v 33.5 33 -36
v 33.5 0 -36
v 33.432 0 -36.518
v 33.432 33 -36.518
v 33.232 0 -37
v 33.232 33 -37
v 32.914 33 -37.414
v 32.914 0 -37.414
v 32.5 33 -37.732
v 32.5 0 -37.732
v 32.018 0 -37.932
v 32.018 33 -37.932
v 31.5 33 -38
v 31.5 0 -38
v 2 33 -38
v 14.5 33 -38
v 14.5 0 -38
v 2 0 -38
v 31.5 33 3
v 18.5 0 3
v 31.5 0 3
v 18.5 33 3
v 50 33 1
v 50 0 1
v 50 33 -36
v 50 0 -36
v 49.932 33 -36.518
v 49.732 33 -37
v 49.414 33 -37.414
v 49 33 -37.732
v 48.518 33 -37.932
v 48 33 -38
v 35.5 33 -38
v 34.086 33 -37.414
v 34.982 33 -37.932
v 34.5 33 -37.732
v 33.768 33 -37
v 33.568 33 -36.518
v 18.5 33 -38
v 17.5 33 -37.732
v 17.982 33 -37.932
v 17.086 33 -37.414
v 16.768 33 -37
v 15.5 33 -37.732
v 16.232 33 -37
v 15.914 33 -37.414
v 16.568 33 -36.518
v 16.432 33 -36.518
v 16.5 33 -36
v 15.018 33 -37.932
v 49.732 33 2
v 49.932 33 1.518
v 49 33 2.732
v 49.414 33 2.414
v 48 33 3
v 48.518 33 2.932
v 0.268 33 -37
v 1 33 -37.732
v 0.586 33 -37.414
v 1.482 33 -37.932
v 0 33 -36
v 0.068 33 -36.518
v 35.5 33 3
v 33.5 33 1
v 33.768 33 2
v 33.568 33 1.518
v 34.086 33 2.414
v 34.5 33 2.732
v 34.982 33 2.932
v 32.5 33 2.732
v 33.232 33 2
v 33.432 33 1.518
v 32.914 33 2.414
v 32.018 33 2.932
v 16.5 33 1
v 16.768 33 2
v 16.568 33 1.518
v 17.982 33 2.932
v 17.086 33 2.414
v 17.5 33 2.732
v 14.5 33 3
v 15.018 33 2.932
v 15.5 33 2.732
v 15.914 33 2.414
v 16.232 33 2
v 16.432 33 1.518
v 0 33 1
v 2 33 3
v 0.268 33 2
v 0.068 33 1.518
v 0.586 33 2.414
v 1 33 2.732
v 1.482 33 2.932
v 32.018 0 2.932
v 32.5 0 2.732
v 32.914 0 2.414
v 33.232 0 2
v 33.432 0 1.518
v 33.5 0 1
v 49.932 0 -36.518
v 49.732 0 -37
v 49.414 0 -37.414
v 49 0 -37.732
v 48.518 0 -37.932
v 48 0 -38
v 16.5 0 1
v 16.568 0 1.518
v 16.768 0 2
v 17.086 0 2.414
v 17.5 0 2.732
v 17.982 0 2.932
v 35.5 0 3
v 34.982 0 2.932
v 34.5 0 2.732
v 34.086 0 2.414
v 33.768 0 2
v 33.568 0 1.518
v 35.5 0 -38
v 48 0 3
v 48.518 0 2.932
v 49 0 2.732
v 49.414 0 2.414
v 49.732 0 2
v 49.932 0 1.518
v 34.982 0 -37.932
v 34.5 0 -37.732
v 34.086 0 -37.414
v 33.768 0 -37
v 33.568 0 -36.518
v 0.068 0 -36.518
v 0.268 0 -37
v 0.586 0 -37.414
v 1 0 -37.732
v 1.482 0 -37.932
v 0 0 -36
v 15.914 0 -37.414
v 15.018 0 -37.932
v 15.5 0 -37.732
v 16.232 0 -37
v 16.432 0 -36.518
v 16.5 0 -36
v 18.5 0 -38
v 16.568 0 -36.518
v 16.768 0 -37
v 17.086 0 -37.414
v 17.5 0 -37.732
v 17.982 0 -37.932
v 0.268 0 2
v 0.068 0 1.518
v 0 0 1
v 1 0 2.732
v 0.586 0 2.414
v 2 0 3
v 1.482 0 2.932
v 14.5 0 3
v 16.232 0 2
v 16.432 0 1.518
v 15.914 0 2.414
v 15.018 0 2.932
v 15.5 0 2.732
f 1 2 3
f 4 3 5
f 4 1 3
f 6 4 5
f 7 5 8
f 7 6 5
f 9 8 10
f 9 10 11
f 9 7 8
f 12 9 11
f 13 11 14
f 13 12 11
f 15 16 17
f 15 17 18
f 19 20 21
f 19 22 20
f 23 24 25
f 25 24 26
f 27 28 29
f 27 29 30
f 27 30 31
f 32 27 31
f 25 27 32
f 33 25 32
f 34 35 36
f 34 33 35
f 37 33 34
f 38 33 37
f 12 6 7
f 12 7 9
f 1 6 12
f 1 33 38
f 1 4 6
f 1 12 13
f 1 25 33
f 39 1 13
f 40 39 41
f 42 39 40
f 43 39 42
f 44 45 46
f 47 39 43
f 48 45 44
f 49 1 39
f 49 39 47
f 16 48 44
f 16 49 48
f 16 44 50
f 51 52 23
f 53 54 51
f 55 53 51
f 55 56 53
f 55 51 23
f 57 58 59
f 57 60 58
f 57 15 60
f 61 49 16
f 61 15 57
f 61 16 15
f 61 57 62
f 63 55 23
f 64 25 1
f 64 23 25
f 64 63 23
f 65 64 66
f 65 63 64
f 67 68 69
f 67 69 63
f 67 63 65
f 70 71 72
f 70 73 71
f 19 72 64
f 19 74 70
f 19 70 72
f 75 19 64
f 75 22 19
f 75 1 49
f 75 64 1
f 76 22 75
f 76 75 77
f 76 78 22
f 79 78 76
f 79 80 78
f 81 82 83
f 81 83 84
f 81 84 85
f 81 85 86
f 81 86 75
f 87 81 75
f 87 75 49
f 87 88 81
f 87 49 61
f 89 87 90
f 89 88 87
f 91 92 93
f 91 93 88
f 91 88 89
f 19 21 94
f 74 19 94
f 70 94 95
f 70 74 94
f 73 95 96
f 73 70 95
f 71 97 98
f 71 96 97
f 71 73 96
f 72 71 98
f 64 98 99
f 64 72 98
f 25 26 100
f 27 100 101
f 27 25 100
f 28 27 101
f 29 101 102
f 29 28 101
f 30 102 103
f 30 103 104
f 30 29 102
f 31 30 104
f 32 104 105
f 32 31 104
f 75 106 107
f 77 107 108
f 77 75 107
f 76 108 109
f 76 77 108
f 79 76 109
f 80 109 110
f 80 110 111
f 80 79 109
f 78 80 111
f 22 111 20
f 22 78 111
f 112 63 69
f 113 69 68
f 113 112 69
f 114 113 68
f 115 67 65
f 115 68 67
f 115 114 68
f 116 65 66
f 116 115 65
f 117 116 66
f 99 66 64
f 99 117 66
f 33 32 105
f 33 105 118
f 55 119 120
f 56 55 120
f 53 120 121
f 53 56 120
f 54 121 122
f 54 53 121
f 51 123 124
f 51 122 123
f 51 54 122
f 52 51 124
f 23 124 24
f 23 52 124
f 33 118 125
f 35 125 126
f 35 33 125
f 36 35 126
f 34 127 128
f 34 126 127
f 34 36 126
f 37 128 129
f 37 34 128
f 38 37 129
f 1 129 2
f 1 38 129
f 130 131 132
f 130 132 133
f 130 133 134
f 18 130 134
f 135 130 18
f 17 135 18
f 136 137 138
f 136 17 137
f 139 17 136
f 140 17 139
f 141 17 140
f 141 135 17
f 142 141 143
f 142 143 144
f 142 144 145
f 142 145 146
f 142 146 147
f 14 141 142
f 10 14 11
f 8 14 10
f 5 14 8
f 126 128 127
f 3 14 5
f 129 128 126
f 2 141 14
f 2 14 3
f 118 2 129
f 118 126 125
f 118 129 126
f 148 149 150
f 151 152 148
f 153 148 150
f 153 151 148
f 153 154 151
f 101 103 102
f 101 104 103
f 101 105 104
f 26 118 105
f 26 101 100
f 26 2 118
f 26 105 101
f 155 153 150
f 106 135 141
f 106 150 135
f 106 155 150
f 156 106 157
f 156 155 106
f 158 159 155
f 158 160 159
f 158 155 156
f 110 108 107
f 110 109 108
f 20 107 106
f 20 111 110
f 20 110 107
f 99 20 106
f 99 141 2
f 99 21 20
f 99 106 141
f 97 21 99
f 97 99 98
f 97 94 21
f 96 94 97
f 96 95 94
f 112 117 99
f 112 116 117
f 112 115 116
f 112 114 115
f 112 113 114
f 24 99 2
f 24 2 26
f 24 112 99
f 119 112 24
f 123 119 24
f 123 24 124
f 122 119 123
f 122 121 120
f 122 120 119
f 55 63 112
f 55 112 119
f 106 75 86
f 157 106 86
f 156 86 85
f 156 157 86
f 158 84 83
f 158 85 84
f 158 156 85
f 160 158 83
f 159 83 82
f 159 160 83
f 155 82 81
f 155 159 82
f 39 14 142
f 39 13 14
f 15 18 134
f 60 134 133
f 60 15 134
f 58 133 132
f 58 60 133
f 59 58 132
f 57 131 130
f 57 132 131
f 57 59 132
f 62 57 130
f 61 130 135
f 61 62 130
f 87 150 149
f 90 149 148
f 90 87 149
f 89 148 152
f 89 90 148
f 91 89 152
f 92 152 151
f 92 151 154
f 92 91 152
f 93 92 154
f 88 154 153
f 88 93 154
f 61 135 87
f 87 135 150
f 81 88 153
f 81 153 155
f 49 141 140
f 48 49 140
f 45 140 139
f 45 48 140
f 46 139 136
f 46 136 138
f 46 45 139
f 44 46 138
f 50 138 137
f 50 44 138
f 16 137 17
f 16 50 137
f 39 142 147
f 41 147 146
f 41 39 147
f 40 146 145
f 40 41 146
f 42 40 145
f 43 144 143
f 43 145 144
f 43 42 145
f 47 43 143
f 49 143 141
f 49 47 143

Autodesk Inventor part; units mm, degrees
ref_plane "YZ Plane" through (0, 0, 0) normal (1, 0, 0) x (0, 1, 0)
ref_plane "XZ Plane" through (0, 0, 0) normal (0, 1, 0) x (-1, 0, 0)
ref_plane "XY Plane" through (0, 0, 0) normal (0, 0, 1) x (1, 0, 0)
sketch "Sketch1" plane through (0, 0, 0) normal (0, 1, 0) x (-1, 0, 0)
  line L0 (0, 0) -> (-50, 0)
  line L1 (-50, 0) -> (-50, -35)
  line L2 (-50, -35) -> (0, -35)
  line L3 (0, -35) -> (0, 0)
  dimension "d0" = 35
  dimension "d1" = 50
extrude "Extrusion1" add sketch "Sketch1" along normal blind 33
sketch "Sketch2" plane through (0, 0, 0) normal (0, 0, 1) x (1, 0, 0)
  line L0 (0, 33) -> (50, 33) projected
  line L1 (16.5, 33) -> (16.5, 0)
  line L2 (0, 0) -> (50, 0) projected
  line L3 (33.5, 33) -> (33.5, 0)
  line L4 (0, 0) -> (0, 33) projected
  line L5 (50, 0) -> (50, 33) projected
  line L6 (0, 0) -> (0, 33) projected
  line L7 (0, 33) -> (16.5, 33)
  line L8 (16.5, 33) -> (16.5, 0)
  line L9 (16.5, 0) -> (0, 0)
  line L10 (0, 0) -> (0, 33)
  line L11 (33.5, 33) -> (50, 33)
  line L12 (50, 33) -> (50, 0)
  line L13 (50, 0) -> (33.5, 0)
  line L14 (33.5, 0) -> (33.5, 33)
  dimension "d4" = 16.5
  dimension "d5" = 16.5
extrude "Extrusion2" add sketch "Sketch2" along normal blind 3 contours L0 L1 L2 L4 | L0 L5 L2 L3
fillet "Fillet1" radius 2 4 edges at (0, 16.5, 3) (16.5, 16.5, 3) (33.5, 16.5, 3) (50, 16.5, 3)
sketch "Sketch3" plane through (16.5, 0, 0) normal (0, 0, 1) x (1, 0, 0)
  line L0 (0, 33) -> (17, 33) projected
  line L1 (17, 0) -> (17, 33) projected
  line L2 (0, 33) -> (17, 33)
  line L3 (17, 33) -> (17, 0)
  line L4 (17, 0) -> (0, 0)
  line L5 (0, 0) -> (0, 33)
  point P0 (-16.5, 0)
extrude "Extrusion3" add sketch "Sketch3" along normal blind 3
fillet "Fillet2" radius 2 2 edges at (16.5, 16.5, 3) (33.5, 16.5, 3)
sketch "Sketch4" plane through (50, 0, -35) normal (0, 0, -1) x (-1, 0, 0)
  line L0 (0, 0) -> (50, 0) projected
  line L1 (33.5, 0) -> (33.5, 33)
  line L2 (0, 33) -> (50, 33) projected
  line L3 (14.5, 0) -> (2, 0) projected
  line L4 (16.5, 0) -> (16.5, 33)
  line L5 (50, 0) -> (50, 33) projected
  line L6 (0, 0) -> (0, 33) projected
  line L7 (50, 0) -> (33.5, 0)
  line L8 (33.5, 0) -> (33.5, 33)
  line L9 (33.5, 33) -> (50, 33)
  line L10 (50, 33) -> (50, 0)
  line L11 (16.5, 0) -> (14.5, 0) projected
  line L12 (16.5, 0) -> (0, 0)
  line L13 (0, 0) -> (0, 33)
  line L14 (0, 33) -> (16.5, 33)
  line L15 (16.5, 33) -> (16.5, 0)
  dimension "d12" = 16.5
  dimension "d13" = 16.5
extrude "Extrusion4" add sketch "Sketch4" along normal blind 3 contours L6 L2 L4 L0 | L2 L5 L0 L1
fillet "Fillet3" radius 2 4 edges at (0, 16.5, -38) (16.5, 16.5, -38) (33.5, 16.5, -38) (50, 16.5, -38)
sketch "Sketch5" plane through (33.5, 0, -35) normal (0, 0, -1) x (-1, 0, 0)
  line L0 (17, 0) -> (17, 33) projected
  line L1 (-2, 33) -> (0, 33) projected
  line L2 (17, 0) -> (0, 0)
  line L3 (0, 0) -> (0, 33)
  line L4 (0, 33) -> (17, 33)
  line L5 (17, 33) -> (17, 0)
  point P0 (33.5, 0)
extrude "Extrusion5" add sketch "Sketch5" along normal blind 3
fillet "Fillet4" radius 2 2 edges at (16.5, 16.5, -38) (33.5, 16.5, -38)
properties part number "Simplistic_battery_pack_batteryspace-spencermical"
